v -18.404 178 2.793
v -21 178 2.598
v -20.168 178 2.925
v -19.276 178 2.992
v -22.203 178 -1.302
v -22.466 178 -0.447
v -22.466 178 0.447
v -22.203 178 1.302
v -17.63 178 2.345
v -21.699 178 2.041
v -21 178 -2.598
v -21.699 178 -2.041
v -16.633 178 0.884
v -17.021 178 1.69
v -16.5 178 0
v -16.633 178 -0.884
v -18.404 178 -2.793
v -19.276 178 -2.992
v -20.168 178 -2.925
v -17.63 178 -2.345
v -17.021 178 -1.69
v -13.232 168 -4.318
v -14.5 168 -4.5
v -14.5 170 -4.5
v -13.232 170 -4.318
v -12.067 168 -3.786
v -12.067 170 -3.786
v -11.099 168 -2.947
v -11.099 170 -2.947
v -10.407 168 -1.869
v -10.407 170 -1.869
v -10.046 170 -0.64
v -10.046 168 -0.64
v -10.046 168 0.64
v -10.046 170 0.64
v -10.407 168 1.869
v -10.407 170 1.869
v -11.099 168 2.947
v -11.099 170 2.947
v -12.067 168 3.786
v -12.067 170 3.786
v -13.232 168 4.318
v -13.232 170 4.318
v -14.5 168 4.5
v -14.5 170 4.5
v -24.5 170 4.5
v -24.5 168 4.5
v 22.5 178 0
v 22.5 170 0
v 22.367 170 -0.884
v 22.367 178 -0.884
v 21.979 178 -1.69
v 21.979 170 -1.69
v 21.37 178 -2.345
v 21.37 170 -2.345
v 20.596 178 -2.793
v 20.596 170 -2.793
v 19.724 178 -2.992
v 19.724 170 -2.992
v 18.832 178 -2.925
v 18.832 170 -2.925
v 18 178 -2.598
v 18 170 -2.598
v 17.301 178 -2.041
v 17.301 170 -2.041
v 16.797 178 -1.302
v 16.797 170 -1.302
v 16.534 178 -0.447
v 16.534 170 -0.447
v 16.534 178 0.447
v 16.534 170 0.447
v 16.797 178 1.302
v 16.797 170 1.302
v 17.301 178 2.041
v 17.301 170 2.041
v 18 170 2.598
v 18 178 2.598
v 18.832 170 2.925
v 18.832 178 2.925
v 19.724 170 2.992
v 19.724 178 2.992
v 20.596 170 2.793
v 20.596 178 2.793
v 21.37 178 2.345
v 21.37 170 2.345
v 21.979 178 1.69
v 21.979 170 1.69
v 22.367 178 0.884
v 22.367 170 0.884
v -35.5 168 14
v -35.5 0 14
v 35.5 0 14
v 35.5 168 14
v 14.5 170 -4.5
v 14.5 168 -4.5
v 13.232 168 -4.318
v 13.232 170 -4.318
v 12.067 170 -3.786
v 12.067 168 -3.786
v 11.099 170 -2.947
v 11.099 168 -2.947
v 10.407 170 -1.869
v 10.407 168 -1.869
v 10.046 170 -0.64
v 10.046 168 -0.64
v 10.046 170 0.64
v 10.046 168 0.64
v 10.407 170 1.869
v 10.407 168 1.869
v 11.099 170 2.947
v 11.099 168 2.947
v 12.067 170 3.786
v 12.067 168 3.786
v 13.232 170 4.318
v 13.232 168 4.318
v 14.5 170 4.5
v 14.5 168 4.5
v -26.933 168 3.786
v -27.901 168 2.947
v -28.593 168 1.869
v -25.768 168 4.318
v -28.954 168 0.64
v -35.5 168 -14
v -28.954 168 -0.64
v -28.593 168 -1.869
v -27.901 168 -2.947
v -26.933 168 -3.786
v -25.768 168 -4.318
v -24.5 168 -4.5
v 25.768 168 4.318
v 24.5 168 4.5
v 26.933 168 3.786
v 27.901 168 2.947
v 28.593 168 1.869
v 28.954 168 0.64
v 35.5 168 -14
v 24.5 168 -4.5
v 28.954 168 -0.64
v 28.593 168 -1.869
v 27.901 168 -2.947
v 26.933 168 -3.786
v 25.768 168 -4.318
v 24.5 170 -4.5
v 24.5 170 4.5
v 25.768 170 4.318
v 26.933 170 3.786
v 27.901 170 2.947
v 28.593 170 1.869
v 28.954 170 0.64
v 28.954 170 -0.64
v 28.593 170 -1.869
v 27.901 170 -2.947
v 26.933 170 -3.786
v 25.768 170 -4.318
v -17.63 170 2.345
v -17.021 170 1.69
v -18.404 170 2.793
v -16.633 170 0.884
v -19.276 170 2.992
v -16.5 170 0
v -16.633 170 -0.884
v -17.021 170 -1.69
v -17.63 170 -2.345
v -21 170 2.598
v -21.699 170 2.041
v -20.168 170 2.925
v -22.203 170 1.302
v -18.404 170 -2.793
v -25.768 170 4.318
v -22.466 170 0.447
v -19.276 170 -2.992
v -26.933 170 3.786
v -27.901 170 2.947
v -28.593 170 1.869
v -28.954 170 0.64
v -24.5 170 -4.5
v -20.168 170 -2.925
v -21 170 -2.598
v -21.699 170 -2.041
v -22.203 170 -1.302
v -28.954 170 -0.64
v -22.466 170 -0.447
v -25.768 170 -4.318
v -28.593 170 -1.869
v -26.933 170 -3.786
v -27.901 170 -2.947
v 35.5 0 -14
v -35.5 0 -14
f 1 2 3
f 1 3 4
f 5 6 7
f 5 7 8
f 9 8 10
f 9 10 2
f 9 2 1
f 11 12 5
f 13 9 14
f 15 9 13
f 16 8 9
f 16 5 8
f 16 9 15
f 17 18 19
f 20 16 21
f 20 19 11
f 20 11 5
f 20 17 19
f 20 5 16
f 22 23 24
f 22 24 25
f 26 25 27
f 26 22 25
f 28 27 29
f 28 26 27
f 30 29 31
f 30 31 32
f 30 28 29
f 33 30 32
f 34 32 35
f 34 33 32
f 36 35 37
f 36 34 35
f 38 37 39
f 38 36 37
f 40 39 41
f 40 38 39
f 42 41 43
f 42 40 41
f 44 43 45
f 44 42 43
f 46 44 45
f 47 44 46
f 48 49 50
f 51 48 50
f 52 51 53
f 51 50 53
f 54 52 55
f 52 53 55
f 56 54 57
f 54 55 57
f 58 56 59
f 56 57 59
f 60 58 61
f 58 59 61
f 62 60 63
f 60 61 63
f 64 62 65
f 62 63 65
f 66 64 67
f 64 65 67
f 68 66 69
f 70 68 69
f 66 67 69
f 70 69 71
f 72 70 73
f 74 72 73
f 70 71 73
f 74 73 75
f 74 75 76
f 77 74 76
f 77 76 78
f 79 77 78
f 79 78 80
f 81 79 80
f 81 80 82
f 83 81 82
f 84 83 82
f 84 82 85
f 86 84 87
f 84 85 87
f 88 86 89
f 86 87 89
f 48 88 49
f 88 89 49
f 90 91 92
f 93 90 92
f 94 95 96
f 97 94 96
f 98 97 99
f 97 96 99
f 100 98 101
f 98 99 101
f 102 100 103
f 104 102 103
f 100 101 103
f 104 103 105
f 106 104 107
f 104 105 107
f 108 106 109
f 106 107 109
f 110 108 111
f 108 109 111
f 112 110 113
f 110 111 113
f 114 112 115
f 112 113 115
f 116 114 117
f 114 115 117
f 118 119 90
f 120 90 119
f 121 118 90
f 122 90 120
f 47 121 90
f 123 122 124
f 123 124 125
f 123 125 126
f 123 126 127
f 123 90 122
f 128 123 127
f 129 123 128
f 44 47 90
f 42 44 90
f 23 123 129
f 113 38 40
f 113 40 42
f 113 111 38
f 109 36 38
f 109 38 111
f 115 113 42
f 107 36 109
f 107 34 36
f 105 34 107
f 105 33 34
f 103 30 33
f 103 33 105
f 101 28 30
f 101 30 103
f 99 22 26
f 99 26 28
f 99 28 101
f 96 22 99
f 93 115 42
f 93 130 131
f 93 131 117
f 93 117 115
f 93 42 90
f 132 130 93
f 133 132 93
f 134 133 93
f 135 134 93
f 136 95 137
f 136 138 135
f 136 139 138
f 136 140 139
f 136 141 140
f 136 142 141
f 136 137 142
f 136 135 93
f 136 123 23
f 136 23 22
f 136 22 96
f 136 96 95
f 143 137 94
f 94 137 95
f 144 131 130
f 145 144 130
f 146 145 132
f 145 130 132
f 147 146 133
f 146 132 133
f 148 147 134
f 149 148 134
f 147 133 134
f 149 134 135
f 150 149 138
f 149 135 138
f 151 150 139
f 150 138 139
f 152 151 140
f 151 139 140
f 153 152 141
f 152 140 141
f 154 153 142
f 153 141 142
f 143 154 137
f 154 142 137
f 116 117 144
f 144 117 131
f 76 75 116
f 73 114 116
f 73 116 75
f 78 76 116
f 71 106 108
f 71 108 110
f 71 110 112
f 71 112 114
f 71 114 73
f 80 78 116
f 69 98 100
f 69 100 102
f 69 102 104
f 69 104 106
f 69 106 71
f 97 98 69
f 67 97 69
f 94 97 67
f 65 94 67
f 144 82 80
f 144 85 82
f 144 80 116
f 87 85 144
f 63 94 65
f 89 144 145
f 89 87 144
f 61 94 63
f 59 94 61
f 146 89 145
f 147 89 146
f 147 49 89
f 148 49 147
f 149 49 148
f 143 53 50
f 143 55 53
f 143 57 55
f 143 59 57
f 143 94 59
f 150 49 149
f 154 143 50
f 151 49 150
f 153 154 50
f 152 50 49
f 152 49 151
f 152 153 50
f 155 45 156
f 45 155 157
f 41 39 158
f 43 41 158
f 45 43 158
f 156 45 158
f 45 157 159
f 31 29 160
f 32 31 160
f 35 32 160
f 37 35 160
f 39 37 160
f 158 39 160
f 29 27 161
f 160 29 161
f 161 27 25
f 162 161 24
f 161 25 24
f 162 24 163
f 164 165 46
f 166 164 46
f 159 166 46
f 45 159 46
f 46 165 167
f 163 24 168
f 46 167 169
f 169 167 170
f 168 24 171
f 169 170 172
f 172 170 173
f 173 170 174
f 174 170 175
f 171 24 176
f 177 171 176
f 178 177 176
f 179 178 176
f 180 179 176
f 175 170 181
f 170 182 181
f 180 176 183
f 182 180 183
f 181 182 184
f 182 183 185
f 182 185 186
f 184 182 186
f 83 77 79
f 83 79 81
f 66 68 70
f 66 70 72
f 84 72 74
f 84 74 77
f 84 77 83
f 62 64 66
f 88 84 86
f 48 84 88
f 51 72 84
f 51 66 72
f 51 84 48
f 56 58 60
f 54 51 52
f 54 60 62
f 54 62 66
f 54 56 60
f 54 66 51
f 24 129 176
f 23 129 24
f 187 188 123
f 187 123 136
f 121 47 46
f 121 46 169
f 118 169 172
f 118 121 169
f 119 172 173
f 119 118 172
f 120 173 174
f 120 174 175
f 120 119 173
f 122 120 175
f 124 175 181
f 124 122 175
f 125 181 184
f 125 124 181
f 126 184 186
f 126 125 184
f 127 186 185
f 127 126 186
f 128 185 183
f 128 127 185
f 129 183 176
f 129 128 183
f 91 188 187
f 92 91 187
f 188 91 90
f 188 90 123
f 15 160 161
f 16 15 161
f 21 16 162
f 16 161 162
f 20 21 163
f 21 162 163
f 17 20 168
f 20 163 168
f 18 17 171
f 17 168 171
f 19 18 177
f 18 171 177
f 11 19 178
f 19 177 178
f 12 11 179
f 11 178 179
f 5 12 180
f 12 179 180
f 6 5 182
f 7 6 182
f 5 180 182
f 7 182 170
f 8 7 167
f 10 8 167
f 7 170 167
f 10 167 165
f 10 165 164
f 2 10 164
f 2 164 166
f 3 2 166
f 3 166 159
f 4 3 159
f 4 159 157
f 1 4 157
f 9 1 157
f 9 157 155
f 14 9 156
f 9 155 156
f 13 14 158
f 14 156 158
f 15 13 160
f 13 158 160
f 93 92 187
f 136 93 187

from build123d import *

# Parameters (mm, degrees)
ESQUISSE1_W        = 71
ESQUISSE1_H        = 28
BOSS_EXTRU_1_DEPTH = 168
BOSS_EXTRU_2_DEPTH = 2
ESQUISSE3_R        = 3
BOSS_EXTRU_3_DEPTH = 8


with BuildPart() as part:
    # Esquisse1 → Boss.-Extru.1 (new body)
    with BuildSketch(Plane(origin=(0, 0, 0), x_dir=(1, 0, 0), z_dir=(0, 1, 0))):
        Rectangle(ESQUISSE1_W, ESQUISSE1_H)
    extrude(amount=BOSS_EXTRU_1_DEPTH)

    # Esquisse2 → Boss.-Extru.2 (add)
    with BuildSketch(Plane(origin=(0, 168, 0), x_dir=(1, 0, 0), z_dir=(0, 1, 0))):
        with BuildLine():
            Line((-24.5, 4.5), (-14.5, 4.5))
            ThreePointArc((-14.5, 4.5), (-10, 0), (-14.5, -4.5))
            Line((-14.5, -4.5), (-24.5, -4.5))
            ThreePointArc((-24.5, -4.5), (-29, 0), (-24.5, 4.5))
        make_face()
        with BuildLine():
            Line((24.5, 4.5), (14.5, 4.5))
            ThreePointArc((14.5, 4.5), (10, 0), (14.5, -4.5))
            Line((14.5, -4.5), (24.5, -4.5))
            ThreePointArc((24.5, -4.5), (29, 0), (24.5, 4.5))
        make_face()
    extrude(amount=BOSS_EXTRU_2_DEPTH)

    # Esquisse3 → Boss.-Extru.3 (add)
    with BuildSketch(Plane(origin=(0, 170, 0), x_dir=(1, 0, 0), z_dir=(0, 1, 0))):
        with Locations((-19.5, 0)):
            Circle(ESQUISSE3_R)
        with Locations((19.5, 0)):
            Circle(ESQUISSE3_R)
    extrude(amount=BOSS_EXTRU_3_DEPTH)


solid = part.part
